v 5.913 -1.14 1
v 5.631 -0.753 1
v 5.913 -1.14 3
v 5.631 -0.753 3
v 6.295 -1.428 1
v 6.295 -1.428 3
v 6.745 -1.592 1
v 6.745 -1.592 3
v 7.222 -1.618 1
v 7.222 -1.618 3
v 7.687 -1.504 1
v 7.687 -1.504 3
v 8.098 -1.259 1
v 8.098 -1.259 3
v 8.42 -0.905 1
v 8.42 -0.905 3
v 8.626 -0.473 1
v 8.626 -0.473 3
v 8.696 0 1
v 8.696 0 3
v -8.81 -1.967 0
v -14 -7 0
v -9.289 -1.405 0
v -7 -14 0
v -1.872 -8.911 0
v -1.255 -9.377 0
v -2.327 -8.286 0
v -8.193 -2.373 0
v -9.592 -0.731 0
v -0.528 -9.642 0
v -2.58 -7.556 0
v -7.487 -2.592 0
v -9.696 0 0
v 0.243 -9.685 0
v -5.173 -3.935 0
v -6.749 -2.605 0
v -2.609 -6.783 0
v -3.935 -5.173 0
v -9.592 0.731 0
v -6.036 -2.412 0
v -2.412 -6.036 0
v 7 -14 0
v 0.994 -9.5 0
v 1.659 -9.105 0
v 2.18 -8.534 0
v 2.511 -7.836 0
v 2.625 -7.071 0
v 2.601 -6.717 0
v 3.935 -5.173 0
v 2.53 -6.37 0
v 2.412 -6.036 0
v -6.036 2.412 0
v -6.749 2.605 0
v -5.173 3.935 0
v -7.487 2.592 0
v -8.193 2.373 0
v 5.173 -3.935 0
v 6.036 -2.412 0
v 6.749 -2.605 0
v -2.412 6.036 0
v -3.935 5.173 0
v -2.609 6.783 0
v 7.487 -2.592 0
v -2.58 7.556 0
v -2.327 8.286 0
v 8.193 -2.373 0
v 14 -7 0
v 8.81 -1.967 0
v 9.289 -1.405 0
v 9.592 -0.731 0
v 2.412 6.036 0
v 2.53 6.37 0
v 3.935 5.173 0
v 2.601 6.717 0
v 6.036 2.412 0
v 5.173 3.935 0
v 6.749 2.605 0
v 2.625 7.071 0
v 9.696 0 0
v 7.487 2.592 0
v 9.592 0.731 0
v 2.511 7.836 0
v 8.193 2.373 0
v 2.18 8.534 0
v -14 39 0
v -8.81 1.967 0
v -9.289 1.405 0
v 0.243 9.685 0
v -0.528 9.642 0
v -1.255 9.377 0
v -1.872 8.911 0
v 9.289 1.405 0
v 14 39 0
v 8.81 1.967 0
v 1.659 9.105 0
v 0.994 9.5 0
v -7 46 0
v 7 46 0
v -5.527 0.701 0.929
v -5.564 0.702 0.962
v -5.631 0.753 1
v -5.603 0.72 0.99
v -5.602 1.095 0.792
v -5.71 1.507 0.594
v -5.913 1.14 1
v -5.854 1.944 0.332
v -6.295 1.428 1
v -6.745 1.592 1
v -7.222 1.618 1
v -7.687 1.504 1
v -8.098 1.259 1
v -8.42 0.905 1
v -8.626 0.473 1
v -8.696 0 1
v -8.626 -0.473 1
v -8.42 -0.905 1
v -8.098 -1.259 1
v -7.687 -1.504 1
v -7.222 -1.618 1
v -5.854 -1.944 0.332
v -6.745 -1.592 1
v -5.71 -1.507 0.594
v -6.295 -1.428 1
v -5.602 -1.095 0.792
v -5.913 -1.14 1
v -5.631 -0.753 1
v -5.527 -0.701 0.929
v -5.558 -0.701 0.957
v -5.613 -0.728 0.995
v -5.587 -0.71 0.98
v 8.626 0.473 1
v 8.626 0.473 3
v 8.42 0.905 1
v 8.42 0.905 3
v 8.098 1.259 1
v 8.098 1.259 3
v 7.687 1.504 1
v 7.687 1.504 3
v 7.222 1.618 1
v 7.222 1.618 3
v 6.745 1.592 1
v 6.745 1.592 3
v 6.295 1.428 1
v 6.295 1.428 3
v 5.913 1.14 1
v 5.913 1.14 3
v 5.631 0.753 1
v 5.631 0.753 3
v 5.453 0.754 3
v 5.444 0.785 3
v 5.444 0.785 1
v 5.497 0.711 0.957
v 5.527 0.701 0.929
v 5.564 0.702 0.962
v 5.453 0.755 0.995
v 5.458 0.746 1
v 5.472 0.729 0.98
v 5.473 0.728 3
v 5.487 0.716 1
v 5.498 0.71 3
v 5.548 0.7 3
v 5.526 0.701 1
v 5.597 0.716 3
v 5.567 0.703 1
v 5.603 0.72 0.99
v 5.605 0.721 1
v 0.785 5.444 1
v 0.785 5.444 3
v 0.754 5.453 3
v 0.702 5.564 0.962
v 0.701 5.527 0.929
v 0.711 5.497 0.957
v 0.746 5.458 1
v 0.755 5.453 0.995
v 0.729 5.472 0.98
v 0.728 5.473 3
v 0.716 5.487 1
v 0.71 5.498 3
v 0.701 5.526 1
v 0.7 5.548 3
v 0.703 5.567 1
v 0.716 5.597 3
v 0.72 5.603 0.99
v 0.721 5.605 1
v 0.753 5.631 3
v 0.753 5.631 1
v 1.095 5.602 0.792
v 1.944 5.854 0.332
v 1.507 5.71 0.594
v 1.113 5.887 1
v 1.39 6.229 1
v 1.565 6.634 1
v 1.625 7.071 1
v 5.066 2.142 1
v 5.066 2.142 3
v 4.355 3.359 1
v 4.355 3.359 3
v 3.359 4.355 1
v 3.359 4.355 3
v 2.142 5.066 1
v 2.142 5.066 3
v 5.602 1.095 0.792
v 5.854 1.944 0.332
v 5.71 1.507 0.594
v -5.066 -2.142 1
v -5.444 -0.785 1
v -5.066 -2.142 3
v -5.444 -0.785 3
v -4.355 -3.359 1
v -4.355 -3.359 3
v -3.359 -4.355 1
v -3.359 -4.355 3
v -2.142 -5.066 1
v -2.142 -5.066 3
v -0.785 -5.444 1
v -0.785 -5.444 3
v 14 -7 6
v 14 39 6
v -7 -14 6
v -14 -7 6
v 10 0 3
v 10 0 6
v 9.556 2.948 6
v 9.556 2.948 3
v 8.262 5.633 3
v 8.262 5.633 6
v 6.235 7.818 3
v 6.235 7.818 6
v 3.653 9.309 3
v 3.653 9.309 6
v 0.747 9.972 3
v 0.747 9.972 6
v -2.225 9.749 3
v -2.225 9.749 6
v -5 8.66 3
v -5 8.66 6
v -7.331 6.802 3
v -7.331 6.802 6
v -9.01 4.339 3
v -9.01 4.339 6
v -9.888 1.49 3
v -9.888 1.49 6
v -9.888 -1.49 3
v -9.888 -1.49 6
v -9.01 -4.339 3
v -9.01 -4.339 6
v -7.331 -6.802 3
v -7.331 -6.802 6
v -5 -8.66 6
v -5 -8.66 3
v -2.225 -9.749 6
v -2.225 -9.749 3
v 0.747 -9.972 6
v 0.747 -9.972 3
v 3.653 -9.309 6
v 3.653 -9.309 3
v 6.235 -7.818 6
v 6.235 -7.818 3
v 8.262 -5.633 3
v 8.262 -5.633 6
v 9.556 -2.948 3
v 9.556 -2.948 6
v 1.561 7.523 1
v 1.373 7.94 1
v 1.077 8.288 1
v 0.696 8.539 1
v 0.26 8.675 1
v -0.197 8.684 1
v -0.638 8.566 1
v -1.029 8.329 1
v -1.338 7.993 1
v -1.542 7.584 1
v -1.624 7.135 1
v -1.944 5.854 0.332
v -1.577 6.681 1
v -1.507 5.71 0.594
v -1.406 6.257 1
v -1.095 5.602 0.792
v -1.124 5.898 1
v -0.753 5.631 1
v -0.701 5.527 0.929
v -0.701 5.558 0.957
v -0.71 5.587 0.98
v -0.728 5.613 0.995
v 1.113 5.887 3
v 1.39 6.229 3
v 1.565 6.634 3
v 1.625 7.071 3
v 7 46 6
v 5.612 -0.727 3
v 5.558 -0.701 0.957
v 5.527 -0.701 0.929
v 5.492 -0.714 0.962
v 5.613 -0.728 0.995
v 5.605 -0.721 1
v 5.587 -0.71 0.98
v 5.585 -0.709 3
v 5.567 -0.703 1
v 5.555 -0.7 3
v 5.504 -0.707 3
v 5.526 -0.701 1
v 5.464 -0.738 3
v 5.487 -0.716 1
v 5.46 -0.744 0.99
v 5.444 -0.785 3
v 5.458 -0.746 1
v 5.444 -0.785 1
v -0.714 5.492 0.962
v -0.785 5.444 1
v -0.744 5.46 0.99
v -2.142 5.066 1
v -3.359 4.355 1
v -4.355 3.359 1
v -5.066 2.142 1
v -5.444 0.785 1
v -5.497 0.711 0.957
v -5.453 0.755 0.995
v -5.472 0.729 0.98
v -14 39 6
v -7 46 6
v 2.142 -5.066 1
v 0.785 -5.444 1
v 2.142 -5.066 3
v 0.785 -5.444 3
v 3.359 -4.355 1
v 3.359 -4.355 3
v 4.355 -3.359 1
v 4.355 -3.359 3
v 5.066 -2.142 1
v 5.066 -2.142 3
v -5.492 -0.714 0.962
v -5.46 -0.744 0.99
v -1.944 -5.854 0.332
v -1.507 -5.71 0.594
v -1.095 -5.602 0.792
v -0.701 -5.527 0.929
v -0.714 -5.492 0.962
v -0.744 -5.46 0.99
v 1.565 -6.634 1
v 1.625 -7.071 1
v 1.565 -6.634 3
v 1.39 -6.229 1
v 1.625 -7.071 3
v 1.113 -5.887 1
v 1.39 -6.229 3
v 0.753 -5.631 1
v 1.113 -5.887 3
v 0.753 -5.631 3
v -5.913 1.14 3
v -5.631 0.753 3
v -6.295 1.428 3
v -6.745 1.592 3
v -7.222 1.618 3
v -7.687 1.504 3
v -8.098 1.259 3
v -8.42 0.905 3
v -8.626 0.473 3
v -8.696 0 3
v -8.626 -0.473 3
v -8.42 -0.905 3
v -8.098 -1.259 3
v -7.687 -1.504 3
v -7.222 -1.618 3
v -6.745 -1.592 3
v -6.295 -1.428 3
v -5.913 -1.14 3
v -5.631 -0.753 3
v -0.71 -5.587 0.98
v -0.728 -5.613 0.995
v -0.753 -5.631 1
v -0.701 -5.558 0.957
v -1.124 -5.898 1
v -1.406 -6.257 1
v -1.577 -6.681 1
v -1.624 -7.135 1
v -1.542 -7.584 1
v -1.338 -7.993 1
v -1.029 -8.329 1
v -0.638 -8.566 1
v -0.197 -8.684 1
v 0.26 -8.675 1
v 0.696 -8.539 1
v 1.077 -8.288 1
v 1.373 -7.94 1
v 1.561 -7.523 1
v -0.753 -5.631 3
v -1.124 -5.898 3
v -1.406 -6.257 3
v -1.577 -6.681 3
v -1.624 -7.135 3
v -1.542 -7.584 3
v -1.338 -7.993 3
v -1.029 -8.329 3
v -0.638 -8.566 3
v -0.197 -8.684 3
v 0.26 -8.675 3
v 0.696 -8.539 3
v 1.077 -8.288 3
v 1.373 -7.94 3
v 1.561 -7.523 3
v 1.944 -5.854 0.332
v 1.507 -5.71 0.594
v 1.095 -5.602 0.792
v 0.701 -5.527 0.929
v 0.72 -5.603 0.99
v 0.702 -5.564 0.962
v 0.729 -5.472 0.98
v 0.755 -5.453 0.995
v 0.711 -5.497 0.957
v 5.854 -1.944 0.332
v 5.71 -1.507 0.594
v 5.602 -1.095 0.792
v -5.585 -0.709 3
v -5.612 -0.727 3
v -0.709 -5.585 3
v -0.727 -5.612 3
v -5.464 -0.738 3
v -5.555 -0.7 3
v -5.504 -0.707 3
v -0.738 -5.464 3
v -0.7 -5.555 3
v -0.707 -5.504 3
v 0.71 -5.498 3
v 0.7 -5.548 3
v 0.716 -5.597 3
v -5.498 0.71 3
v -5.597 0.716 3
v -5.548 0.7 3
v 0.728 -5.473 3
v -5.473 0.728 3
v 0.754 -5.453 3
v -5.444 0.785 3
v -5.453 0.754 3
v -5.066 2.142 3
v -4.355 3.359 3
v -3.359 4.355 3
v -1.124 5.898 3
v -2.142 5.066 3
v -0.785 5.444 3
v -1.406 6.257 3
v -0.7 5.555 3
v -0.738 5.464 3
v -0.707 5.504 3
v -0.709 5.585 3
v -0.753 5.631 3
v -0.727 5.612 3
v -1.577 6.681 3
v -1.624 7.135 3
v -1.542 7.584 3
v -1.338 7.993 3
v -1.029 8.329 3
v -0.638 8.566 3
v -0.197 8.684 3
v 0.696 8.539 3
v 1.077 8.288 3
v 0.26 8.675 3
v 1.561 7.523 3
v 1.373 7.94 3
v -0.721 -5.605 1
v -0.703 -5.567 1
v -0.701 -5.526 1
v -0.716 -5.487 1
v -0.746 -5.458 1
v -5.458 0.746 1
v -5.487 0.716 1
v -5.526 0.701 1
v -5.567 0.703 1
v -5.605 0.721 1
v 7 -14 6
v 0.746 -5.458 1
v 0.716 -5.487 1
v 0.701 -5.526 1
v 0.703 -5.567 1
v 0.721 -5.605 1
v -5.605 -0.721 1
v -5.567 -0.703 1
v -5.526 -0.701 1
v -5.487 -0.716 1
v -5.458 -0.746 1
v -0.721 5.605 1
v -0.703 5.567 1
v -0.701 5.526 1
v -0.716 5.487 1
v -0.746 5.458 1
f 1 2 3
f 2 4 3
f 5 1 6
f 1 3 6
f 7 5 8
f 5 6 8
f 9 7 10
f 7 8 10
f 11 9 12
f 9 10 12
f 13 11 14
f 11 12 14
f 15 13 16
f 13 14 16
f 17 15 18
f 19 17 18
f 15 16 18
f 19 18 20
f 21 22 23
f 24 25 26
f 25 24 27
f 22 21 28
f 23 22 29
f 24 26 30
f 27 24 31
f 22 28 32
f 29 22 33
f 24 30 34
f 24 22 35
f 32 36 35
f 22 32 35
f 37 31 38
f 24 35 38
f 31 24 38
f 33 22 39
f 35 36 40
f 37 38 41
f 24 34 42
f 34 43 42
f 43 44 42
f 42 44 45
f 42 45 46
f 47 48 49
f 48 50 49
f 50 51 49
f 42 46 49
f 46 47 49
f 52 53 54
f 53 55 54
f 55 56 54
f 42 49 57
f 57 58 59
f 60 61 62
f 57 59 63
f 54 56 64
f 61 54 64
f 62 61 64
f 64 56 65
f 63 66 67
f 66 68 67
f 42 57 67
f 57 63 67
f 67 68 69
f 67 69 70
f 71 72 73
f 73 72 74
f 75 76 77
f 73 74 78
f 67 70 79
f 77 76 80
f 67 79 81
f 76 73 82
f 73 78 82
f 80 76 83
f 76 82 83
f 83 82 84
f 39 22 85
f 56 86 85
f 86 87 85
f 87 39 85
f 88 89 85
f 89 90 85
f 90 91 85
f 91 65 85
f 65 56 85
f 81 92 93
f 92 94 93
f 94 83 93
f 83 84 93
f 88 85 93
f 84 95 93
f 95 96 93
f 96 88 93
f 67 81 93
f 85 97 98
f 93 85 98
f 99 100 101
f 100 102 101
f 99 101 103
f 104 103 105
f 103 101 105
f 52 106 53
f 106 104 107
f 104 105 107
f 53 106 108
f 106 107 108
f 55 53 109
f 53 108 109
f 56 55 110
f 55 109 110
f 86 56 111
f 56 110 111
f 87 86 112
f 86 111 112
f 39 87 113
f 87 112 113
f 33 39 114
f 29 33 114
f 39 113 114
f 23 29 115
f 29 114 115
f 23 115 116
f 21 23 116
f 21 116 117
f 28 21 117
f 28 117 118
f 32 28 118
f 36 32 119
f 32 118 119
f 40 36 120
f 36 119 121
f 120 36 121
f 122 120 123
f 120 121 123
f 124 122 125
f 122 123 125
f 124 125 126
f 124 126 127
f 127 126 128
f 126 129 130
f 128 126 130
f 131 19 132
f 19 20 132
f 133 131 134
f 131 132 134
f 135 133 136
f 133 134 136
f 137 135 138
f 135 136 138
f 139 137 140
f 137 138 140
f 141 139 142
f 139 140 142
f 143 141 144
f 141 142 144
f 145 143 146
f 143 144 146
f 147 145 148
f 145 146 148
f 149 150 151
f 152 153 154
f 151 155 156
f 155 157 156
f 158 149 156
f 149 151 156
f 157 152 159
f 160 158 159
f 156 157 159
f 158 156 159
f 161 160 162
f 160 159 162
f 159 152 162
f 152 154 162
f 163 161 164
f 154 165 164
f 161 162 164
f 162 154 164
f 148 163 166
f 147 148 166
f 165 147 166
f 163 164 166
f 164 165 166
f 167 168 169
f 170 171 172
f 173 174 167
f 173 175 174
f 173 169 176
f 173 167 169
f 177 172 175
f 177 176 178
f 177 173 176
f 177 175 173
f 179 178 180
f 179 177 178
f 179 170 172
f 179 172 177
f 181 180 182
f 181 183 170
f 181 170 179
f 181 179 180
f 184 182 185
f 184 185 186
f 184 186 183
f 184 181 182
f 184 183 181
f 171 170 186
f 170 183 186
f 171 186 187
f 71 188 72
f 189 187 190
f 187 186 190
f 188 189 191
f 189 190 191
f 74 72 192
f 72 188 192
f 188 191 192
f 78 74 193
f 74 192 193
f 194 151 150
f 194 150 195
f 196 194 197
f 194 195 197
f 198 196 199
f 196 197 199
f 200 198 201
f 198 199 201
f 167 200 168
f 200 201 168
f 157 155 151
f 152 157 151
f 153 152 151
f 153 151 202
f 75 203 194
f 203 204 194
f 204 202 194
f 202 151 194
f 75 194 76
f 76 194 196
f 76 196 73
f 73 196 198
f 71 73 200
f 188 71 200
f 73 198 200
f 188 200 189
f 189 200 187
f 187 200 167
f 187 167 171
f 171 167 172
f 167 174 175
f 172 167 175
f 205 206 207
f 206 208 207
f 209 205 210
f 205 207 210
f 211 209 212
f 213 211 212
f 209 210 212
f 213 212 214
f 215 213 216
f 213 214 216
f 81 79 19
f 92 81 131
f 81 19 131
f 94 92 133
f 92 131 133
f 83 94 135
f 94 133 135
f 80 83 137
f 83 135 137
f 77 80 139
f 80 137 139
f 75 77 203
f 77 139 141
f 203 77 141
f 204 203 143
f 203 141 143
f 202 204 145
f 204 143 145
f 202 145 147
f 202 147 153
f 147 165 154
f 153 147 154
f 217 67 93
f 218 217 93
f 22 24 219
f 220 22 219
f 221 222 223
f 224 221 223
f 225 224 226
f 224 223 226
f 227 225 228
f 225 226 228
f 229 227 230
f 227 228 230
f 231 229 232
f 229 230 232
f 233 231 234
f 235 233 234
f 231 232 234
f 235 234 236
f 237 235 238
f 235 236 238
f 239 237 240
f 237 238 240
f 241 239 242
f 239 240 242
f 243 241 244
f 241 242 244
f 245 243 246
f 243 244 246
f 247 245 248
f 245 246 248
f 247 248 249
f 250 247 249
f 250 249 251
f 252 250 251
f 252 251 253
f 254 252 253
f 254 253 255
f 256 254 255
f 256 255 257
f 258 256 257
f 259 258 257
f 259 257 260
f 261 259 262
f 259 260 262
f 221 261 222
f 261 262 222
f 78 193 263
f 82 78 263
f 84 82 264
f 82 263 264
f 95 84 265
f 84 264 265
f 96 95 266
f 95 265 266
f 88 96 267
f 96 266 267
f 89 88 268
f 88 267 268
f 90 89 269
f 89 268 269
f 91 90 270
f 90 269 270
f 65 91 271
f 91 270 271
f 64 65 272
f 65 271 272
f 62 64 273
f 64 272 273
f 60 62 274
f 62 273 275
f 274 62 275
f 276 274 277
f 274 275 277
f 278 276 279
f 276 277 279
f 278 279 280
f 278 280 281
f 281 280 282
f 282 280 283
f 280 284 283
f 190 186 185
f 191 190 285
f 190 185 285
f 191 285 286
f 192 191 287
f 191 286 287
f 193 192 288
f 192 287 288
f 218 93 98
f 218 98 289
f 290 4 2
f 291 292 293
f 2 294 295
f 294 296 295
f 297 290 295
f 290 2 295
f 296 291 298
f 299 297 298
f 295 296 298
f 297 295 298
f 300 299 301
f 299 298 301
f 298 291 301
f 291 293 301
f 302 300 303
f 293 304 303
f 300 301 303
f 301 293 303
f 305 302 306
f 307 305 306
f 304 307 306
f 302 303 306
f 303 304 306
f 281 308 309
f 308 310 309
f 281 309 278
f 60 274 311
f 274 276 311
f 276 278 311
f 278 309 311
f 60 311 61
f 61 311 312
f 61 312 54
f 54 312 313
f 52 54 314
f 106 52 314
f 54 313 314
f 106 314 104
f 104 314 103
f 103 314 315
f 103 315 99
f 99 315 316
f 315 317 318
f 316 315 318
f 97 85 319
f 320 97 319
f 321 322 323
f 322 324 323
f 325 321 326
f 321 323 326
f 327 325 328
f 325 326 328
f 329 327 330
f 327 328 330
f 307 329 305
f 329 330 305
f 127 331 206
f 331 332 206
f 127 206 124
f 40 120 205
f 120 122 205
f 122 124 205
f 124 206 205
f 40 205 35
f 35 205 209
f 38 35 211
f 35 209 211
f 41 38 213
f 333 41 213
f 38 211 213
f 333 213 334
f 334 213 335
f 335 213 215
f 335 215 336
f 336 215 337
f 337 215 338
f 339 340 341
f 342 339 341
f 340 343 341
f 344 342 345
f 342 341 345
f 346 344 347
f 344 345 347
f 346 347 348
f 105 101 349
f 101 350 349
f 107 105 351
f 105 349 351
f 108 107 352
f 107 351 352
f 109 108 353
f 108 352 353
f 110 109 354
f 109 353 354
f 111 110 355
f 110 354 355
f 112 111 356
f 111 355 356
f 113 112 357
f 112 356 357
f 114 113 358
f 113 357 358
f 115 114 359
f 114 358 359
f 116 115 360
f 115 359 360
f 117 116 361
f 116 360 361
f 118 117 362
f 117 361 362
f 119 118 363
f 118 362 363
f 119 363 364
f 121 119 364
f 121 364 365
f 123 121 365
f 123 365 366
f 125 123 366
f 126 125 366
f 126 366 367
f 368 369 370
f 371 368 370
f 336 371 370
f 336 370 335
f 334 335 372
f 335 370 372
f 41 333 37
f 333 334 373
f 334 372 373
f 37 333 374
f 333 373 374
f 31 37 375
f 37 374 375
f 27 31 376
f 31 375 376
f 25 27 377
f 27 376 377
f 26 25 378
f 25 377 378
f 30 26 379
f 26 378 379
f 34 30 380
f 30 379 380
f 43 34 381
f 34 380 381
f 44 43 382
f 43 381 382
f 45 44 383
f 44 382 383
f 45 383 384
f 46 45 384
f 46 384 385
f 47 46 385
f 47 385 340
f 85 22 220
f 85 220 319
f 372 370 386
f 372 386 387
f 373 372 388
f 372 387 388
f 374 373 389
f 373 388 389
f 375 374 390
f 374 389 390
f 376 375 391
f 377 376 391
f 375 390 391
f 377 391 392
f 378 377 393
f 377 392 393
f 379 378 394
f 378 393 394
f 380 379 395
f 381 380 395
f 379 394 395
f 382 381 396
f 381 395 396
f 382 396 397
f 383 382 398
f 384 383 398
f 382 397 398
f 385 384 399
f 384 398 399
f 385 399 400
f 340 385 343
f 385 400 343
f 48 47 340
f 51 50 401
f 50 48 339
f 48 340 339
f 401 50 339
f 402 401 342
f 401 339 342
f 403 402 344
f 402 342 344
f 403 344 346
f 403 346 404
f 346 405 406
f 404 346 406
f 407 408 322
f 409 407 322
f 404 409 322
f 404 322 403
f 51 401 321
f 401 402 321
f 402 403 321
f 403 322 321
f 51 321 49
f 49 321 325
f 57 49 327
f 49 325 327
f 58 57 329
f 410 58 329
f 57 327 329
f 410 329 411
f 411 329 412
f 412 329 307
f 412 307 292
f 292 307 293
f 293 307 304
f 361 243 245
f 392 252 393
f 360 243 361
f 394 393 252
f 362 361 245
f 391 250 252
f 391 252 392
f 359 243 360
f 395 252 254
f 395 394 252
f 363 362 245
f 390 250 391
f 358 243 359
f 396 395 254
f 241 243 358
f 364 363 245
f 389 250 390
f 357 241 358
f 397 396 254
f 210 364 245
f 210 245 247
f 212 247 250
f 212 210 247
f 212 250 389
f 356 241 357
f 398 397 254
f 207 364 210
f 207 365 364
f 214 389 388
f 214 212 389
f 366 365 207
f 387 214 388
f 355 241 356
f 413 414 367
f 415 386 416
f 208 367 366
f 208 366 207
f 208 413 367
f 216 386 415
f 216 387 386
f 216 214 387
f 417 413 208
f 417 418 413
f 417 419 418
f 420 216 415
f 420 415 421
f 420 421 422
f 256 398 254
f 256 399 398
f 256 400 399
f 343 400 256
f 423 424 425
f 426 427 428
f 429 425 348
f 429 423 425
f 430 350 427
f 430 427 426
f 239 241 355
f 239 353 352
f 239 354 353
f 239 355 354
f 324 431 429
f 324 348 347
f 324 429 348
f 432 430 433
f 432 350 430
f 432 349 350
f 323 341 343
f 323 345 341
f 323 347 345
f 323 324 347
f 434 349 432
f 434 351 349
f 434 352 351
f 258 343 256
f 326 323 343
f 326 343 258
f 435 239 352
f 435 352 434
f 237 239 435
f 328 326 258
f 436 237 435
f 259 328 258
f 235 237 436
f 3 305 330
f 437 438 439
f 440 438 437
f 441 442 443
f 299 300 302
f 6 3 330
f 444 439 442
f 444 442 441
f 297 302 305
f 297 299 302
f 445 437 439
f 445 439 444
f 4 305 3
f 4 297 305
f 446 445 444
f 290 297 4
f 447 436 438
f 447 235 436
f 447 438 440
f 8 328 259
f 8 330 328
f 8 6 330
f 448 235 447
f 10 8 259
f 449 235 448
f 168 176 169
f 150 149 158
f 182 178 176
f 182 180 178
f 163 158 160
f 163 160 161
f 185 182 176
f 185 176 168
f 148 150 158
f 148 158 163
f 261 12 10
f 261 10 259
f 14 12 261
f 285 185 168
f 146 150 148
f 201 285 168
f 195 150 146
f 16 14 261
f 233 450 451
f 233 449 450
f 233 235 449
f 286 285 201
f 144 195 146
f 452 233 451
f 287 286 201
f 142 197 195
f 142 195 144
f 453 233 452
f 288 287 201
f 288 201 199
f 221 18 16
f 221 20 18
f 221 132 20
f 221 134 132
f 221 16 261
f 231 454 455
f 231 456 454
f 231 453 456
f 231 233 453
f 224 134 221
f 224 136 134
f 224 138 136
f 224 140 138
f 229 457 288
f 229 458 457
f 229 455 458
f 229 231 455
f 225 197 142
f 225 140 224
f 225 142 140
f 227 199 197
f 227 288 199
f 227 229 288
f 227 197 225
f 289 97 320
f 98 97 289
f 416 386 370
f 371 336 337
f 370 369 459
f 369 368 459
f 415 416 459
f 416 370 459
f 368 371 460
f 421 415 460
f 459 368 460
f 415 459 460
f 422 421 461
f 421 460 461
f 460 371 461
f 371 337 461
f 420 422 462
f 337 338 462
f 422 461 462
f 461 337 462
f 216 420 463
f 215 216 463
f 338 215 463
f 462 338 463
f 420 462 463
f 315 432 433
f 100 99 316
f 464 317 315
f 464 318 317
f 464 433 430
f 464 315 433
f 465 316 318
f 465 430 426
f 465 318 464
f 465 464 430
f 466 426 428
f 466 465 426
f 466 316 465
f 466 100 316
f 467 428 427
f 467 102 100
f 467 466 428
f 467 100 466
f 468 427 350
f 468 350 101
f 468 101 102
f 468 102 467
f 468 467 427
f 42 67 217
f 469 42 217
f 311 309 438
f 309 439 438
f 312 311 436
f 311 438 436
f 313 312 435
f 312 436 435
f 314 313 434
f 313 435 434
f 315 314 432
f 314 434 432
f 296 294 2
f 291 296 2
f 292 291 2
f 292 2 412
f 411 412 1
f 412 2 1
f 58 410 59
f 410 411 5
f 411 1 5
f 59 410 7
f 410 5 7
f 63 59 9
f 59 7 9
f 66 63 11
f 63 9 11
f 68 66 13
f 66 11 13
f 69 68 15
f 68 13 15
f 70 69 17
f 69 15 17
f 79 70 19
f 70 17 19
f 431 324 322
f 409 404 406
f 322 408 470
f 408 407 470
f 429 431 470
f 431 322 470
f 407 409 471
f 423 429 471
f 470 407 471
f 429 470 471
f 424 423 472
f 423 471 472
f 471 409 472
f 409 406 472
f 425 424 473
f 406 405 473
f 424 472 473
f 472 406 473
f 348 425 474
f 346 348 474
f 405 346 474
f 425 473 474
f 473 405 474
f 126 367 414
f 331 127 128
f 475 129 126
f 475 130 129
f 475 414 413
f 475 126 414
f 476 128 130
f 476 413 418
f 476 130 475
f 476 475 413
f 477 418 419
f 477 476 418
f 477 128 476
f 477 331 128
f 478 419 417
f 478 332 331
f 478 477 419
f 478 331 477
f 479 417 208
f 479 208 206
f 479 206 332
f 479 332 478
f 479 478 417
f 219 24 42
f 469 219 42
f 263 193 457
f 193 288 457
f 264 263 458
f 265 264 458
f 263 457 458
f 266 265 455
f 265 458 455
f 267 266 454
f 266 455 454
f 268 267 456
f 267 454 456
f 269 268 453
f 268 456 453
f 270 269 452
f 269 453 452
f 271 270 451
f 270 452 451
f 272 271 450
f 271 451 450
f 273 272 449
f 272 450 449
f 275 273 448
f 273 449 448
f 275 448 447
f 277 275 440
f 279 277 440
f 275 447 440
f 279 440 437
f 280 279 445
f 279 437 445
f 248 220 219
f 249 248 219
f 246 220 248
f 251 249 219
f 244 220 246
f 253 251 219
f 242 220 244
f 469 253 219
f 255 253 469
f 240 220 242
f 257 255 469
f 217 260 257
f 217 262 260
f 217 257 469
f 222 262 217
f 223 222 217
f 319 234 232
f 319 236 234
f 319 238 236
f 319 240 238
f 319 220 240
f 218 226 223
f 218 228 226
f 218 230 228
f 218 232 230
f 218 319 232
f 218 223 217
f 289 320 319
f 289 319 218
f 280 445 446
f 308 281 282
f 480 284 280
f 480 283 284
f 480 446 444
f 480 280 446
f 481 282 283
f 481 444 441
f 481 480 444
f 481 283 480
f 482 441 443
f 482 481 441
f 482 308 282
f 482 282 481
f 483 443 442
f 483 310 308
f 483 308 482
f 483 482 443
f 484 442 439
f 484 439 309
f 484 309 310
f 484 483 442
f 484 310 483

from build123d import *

# Parameters (mm, degrees)
F0_W     = 28
F0_H     = 60
F1_DEPTH = 6
F2_R     = 10
F3_DEPTH = 3
F5_DEPTH = 3.001
F6_SIZE  = 1
F7_SIZE  = 7
F8_R     = 0.1


with BuildPart() as f1:
    # F0 (on Top) → F1 (new body)
    with BuildSketch(Plane.XY):
        with Locations((0, 16)):
            Rectangle(F0_W, F0_H)
    extrude(amount=F1_DEPTH)

    # F2 (on face) → F3 (cut)
    with BuildSketch(Plane.XY.offset(6)):
        Circle(F2_R)
    extrude(amount=-F3_DEPTH, mode=Mode.SUBTRACT)

    # F4 (on face) → F5 (cut, through all)
    with BuildSketch(Plane.XY.offset(3)):
        with BuildLine():
            ThreePointArc((5.4878115346, -0.3659570474), (5.4969520391, -0.183079982), (5.5, 0))
            ThreePointArc((5.5, 0), (5.4969520391, 0.183079982), (5.4878115346, 0.3659570474))
            ThreePointArc((5.4878115346, 0.3659570474), (5.4460678119, 0), (5.4878115346, -0.3659570474))
        make_face()
        with BuildLine():
            ThreePointArc((5.4878115346, 0.3659570474), (5.4969520391, 0.183079982), (5.5, 0))
            ThreePointArc((5.5, 0), (5.4969520391, -0.183079982), (5.4878115346, -0.3659570474))
            ThreePointArc((5.4878115346, -0.3659570474), (7.2552328866, -1.614530342), (8.6960678119, 0))
            ThreePointArc((8.6960678119, 0), (7.2552328866, 1.614530342), (5.4878115346, 0.3659570474))
        make_face()
        with BuildLine():
            ThreePointArc((5.4878115346, -0.3659570474), (5.4460678119, 0), (5.4878115346, 0.3659570474))
            ThreePointArc((5.4878115346, 0.3659570474), (3.8890872965, 3.8890872965), (0.3659570474, 5.4878115346))
            ThreePointArc((0.3659570474, 5.4878115346), (0, 5.4460678119), (-0.3659570474, 5.4878115346))
            ThreePointArc((-0.3659570474, 5.4878115346), (-3.8890872965, 3.8890872965), (-5.4878115346, 0.3659570474))
            ThreePointArc((-5.4878115346, 0.3659570474), (-5.4565374699, 0.1841650747), (-5.4460678119, 0))
            ThreePointArc((-5.4460678119, 0), (-5.4565374699, -0.1841650747), (-5.4878115346, -0.3659570474))
            ThreePointArc((-5.4878115346, -0.3659570474), (-3.8890872965, -3.8890872965), (-0.3659570474, -5.4878115346))
            ThreePointArc((-0.3659570474, -5.4878115346), (0, -5.4460678119), (0.3659570474, -5.4878115346))
            ThreePointArc((0.3659570474, -5.4878115346), (3.8890872965, -3.8890872965), (5.4878115346, -0.3659570474))
        make_face()
        with BuildLine():
            ThreePointArc((-0.3659570474, 5.4878115346), (0, 5.4460678119), (0.3659570474, 5.4878115346))
            ThreePointArc((0.3659570474, 5.4878115346), (0, 5.5), (-0.3659570474, 5.4878115346))
        make_face()
        with BuildLine():
            ThreePointArc((-0.3659570474, 5.4878115346), (0, 5.5), (0.3659570474, 5.4878115346))
            ThreePointArc((0.3659570474, 5.4878115346), (1.2718697264, 6.0596468318), (1.625, 7.0710678119))
            ThreePointArc((1.625, 7.0710678119), (-1.0114209801, 8.3429375383), (-0.3659570474, 5.4878115346))
        make_face()
        with BuildLine():
            ThreePointArc((1.625, -7.0710678119), (1.2718697264, -6.0596468318), (0.3659570474, -5.4878115346))
            ThreePointArc((0.3659570474, -5.4878115346), (0, -5.5), (-0.3659570474, -5.4878115346))
            ThreePointArc((-0.3659570474, -5.4878115346), (-1.0114209801, -8.3429375383), (1.625, -7.0710678119))
        make_face()
        with BuildLine():
            ThreePointArc((-0.3659570474, -5.4878115346), (0, -5.5), (0.3659570474, -5.4878115346))
            ThreePointArc((0.3659570474, -5.4878115346), (0, -5.4460678119), (-0.3659570474, -5.4878115346))
        make_face()
        with BuildLine():
            ThreePointArc((-5.4460678119, 0), (-5.4565374699, 0.1841650747), (-5.4878115346, 0.3659570474))
            ThreePointArc((-5.4878115346, 0.3659570474), (-5.5, 0), (-5.4878115346, -0.3659570474))
            ThreePointArc((-5.4878115346, -0.3659570474), (-5.4565374699, -0.1841650747), (-5.4460678119, 0))
        make_face()
        with BuildLine():
            ThreePointArc((-5.4878115346, -0.3659570474), (-5.5, 0), (-5.4878115346, 0.3659570474))
            ThreePointArc((-5.4878115346, 0.3659570474), (-8.6960678119, 0), (-5.4878115346, -0.3659570474))
        make_face()
    extrude(amount=-F5_DEPTH, mode=Mode.SUBTRACT)

    # F6
    f6_edges = [f1.edges().sort_by_distance(p)[0] for p in [
        (3.889087, 3.889087, 0),
        (-3.889087, 3.889087, 0),
        (-3.889087, -3.889087, 0),
        (3.889087, -3.889087, 0),
        (0, -8.696068, 0),
        (8.696068, 0, 0),
        (-8.696068, 0, 0),
        (0, 8.696068, 0),
    ]]
    chamfer(f6_edges, length=F6_SIZE)

    # F7
    f7_edges = [f1.edges().sort_by_distance(p)[0] for p in [
        (14, -14, 3),
        (-14, -14, 3),
        (14, 46, 3),
        (-14, 46, 3),
    ]]
    chamfer(f7_edges, length=F7_SIZE)

    # F8
    f8_edges = [f1.edges().sort_by_distance(p)[0] for p in [
        (-0.365957, 5.487812, 2),
        (-5.487812, 0.365957, 2),
        (-5.487812, -0.365957, 2),
        (0.365957, 5.487812, 2),
        (5.487812, 0.365957, 2),
        (5.487812, -0.365957, 2),
        (-0.365957, -5.487812, 2),
        (0.365957, -5.487812, 2),
    ]]
    fillet(f8_edges, radius=F8_R)


solid = f1.part
